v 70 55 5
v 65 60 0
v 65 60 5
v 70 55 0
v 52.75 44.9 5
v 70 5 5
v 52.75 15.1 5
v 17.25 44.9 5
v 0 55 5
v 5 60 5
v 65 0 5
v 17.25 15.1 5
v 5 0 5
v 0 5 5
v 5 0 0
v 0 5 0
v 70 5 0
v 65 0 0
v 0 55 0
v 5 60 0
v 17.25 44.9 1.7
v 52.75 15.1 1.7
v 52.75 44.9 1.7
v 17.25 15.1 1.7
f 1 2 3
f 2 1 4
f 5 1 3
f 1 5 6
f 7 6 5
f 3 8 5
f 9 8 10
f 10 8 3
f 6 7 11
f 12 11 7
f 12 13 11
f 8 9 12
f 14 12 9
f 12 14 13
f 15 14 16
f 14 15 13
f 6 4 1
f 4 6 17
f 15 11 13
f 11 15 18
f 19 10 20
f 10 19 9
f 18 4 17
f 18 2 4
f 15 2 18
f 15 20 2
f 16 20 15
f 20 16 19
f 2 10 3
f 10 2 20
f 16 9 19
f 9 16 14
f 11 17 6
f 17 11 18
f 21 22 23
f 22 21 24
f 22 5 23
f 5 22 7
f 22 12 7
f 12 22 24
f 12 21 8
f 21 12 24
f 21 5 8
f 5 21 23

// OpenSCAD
$fn = 32;

// ----------------------------------------------------------------------
// Windowed plate: 1 voids, 70 x 60 x 5 mm
// ----------------------------------------------------------------------

// --- parameters (mm) ---
plate_l = 70;             // plate length, X
plate_w = 60;             // plate width, Y
plate_t = 5;              // plate thickness, Z
edge_margin = 12;         // wall from the plate edge to any window
win1_l = 35.5;            // window length
win1_w = 29.8;            // window width
depth_1 = 3.3;            // depth of void 1 (full thickness = through)
corner_c = 5;             // corner chamfer of the plate

profile = [[5, 0], [65, 0], [70, 5], [70, 55], [65, 60], [5, 60], [0, 55], [0, 5]];  // primary outline, 8 points, counter clockwise
void_1 = [[17.25, 15.1], [52.75, 15.1], [52.75, 44.9], [17.25, 44.9]];  // large central window, 4 points

// --- the one profile operation ---
difference() {
  linear_extrude(height = plate_t) polygon(points = profile);
  translate([0, 0, plate_t - depth_1])
    linear_extrude(height = depth_1 + 1) polygon(points = void_1);
}
